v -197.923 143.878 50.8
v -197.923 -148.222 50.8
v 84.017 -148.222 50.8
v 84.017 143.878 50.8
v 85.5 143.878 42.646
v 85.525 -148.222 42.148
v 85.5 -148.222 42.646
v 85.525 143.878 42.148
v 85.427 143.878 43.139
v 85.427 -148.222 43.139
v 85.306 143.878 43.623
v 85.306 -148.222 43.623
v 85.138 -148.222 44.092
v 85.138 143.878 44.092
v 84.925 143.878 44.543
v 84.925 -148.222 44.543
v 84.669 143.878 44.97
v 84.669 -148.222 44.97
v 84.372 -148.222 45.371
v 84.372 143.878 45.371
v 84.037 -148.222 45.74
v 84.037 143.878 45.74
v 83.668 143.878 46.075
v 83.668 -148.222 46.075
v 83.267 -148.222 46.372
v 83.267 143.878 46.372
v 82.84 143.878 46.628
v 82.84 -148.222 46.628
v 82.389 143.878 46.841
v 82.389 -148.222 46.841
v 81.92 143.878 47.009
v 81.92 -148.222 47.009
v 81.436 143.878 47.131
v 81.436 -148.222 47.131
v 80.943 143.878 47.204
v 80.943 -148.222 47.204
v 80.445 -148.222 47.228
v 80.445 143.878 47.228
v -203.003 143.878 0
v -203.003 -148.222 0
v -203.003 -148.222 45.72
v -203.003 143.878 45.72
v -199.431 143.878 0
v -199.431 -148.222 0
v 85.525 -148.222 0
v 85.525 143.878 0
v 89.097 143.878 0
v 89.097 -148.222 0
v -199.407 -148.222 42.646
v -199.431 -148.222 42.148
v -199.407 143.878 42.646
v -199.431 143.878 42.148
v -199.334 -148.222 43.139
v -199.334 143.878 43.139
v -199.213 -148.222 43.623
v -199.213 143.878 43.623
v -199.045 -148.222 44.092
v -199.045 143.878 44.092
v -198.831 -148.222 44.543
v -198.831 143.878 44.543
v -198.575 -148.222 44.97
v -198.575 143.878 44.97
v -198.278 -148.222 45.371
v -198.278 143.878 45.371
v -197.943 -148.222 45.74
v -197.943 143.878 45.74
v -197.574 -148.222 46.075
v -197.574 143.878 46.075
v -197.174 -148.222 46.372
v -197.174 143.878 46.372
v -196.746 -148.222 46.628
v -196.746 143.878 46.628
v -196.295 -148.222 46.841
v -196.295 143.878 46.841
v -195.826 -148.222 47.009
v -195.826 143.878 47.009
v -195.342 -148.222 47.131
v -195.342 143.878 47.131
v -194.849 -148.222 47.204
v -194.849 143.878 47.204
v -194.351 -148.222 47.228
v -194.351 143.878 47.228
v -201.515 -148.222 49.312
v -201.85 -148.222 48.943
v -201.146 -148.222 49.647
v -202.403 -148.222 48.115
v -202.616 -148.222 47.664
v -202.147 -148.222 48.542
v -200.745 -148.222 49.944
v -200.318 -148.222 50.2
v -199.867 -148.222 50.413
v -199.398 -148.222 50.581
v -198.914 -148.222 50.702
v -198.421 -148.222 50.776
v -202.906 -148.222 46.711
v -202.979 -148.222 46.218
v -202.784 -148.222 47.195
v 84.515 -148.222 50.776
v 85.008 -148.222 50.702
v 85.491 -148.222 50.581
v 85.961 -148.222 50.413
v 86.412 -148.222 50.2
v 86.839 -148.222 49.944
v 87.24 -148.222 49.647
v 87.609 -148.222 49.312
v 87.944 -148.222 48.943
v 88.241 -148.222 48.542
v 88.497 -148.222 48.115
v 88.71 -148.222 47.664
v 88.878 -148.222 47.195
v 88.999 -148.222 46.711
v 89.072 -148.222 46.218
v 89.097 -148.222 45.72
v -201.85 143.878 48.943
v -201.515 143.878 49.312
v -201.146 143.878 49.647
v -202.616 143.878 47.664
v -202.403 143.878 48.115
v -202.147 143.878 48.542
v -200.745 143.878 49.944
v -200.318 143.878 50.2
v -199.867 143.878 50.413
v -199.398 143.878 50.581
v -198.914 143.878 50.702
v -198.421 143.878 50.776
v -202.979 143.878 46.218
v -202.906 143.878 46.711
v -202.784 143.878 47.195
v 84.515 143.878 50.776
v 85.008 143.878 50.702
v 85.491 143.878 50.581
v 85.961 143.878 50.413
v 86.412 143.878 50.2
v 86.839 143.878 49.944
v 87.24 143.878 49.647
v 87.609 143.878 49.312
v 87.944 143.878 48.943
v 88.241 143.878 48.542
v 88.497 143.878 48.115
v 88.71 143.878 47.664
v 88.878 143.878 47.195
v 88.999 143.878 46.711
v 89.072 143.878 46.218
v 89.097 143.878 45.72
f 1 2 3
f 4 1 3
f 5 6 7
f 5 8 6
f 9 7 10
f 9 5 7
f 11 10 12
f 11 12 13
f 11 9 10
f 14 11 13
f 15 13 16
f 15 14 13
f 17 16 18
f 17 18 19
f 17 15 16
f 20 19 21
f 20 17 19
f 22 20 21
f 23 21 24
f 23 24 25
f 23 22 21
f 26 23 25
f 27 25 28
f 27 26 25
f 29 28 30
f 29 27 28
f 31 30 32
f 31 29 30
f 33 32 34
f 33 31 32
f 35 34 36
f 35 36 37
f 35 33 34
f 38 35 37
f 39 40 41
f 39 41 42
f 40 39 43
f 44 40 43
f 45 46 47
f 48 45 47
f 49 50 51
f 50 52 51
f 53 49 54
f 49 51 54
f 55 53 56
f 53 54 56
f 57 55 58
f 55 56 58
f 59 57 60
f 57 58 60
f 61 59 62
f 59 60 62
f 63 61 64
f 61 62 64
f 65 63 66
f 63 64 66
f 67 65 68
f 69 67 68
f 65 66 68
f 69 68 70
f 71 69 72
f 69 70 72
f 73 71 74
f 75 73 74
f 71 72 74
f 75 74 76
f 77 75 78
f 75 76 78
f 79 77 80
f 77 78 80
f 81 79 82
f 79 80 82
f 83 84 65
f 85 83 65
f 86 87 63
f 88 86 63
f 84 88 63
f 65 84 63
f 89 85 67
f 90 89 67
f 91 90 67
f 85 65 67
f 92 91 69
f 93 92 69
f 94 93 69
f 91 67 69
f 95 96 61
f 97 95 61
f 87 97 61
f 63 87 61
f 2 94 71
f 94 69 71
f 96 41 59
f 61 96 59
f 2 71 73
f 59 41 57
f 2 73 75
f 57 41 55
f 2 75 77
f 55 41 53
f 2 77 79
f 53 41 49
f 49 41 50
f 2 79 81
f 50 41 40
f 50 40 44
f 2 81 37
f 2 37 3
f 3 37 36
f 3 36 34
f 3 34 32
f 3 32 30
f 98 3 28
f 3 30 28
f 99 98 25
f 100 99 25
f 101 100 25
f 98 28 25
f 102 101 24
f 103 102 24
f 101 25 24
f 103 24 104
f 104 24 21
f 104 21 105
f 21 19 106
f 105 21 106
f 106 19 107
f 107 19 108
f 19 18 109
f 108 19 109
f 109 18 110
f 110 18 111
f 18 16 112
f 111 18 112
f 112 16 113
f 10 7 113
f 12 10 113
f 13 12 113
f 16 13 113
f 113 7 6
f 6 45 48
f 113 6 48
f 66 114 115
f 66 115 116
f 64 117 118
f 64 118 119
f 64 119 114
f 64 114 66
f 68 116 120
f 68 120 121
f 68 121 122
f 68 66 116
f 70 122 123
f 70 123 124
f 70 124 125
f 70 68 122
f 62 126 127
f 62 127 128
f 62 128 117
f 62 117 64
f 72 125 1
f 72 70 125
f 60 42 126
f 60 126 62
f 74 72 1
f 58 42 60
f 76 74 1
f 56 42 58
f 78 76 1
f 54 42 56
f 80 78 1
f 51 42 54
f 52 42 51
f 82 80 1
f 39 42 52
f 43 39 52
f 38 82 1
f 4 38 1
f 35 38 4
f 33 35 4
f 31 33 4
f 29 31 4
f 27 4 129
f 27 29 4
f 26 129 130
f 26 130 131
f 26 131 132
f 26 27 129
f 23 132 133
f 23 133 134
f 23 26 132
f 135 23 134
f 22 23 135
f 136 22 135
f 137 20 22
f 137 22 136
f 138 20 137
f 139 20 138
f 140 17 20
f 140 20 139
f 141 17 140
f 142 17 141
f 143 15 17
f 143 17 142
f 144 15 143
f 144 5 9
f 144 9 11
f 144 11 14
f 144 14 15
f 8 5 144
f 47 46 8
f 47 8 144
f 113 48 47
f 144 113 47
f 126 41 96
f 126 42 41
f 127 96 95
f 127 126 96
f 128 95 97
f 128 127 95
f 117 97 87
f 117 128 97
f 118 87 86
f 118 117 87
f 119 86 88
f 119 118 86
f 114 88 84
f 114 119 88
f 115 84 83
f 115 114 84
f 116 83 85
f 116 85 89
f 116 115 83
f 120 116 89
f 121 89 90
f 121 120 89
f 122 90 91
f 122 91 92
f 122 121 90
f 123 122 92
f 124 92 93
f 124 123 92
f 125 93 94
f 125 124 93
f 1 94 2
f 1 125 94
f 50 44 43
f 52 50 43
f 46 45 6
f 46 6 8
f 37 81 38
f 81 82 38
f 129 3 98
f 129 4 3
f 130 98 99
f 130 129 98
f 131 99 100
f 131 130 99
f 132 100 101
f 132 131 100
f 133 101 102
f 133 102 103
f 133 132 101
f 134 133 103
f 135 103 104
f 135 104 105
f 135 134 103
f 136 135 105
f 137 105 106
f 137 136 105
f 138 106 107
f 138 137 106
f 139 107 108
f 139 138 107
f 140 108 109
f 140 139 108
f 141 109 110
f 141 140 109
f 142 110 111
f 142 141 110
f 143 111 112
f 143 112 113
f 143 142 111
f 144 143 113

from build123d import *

# Parameters (mm, degrees)
F0_W     = 292.1
F0_H     = 292.1
F1_DEPTH = 50.8
F2_T     = -3.571875
F3_R     = 5.08


with BuildPart() as f1:
    # F0 (on Top) → F1 (new body)
    with BuildSketch(Plane.XY):
        with Locations((-56.953185622, -2.171928063)):
            Rectangle(F0_W, F0_H)
    extrude(amount=F1_DEPTH)

    # F2
    f2_openings = [f1.faces().sort_by_distance(p)[0] for p in [
        (-56.953186, -148.221928, 25.4),
        (-56.953186, 143.878072, 25.4),
        (-56.953186, -2.171928, 0),
    ]]
    offset(amount=F2_T, openings=f2_openings)

    # F3
    f3_edges = [f1.edges().sort_by_distance(p)[0] for p in [
        (-199.431311, -2.171928, 47.228125),
        (85.524939, -2.171928, 47.228125),
        (-203.003186, -2.171928, 50.8),
        (89.096814, -2.171928, 50.8),
    ]]
    fillet(f3_edges, radius=F3_R)


solid = f1.part
